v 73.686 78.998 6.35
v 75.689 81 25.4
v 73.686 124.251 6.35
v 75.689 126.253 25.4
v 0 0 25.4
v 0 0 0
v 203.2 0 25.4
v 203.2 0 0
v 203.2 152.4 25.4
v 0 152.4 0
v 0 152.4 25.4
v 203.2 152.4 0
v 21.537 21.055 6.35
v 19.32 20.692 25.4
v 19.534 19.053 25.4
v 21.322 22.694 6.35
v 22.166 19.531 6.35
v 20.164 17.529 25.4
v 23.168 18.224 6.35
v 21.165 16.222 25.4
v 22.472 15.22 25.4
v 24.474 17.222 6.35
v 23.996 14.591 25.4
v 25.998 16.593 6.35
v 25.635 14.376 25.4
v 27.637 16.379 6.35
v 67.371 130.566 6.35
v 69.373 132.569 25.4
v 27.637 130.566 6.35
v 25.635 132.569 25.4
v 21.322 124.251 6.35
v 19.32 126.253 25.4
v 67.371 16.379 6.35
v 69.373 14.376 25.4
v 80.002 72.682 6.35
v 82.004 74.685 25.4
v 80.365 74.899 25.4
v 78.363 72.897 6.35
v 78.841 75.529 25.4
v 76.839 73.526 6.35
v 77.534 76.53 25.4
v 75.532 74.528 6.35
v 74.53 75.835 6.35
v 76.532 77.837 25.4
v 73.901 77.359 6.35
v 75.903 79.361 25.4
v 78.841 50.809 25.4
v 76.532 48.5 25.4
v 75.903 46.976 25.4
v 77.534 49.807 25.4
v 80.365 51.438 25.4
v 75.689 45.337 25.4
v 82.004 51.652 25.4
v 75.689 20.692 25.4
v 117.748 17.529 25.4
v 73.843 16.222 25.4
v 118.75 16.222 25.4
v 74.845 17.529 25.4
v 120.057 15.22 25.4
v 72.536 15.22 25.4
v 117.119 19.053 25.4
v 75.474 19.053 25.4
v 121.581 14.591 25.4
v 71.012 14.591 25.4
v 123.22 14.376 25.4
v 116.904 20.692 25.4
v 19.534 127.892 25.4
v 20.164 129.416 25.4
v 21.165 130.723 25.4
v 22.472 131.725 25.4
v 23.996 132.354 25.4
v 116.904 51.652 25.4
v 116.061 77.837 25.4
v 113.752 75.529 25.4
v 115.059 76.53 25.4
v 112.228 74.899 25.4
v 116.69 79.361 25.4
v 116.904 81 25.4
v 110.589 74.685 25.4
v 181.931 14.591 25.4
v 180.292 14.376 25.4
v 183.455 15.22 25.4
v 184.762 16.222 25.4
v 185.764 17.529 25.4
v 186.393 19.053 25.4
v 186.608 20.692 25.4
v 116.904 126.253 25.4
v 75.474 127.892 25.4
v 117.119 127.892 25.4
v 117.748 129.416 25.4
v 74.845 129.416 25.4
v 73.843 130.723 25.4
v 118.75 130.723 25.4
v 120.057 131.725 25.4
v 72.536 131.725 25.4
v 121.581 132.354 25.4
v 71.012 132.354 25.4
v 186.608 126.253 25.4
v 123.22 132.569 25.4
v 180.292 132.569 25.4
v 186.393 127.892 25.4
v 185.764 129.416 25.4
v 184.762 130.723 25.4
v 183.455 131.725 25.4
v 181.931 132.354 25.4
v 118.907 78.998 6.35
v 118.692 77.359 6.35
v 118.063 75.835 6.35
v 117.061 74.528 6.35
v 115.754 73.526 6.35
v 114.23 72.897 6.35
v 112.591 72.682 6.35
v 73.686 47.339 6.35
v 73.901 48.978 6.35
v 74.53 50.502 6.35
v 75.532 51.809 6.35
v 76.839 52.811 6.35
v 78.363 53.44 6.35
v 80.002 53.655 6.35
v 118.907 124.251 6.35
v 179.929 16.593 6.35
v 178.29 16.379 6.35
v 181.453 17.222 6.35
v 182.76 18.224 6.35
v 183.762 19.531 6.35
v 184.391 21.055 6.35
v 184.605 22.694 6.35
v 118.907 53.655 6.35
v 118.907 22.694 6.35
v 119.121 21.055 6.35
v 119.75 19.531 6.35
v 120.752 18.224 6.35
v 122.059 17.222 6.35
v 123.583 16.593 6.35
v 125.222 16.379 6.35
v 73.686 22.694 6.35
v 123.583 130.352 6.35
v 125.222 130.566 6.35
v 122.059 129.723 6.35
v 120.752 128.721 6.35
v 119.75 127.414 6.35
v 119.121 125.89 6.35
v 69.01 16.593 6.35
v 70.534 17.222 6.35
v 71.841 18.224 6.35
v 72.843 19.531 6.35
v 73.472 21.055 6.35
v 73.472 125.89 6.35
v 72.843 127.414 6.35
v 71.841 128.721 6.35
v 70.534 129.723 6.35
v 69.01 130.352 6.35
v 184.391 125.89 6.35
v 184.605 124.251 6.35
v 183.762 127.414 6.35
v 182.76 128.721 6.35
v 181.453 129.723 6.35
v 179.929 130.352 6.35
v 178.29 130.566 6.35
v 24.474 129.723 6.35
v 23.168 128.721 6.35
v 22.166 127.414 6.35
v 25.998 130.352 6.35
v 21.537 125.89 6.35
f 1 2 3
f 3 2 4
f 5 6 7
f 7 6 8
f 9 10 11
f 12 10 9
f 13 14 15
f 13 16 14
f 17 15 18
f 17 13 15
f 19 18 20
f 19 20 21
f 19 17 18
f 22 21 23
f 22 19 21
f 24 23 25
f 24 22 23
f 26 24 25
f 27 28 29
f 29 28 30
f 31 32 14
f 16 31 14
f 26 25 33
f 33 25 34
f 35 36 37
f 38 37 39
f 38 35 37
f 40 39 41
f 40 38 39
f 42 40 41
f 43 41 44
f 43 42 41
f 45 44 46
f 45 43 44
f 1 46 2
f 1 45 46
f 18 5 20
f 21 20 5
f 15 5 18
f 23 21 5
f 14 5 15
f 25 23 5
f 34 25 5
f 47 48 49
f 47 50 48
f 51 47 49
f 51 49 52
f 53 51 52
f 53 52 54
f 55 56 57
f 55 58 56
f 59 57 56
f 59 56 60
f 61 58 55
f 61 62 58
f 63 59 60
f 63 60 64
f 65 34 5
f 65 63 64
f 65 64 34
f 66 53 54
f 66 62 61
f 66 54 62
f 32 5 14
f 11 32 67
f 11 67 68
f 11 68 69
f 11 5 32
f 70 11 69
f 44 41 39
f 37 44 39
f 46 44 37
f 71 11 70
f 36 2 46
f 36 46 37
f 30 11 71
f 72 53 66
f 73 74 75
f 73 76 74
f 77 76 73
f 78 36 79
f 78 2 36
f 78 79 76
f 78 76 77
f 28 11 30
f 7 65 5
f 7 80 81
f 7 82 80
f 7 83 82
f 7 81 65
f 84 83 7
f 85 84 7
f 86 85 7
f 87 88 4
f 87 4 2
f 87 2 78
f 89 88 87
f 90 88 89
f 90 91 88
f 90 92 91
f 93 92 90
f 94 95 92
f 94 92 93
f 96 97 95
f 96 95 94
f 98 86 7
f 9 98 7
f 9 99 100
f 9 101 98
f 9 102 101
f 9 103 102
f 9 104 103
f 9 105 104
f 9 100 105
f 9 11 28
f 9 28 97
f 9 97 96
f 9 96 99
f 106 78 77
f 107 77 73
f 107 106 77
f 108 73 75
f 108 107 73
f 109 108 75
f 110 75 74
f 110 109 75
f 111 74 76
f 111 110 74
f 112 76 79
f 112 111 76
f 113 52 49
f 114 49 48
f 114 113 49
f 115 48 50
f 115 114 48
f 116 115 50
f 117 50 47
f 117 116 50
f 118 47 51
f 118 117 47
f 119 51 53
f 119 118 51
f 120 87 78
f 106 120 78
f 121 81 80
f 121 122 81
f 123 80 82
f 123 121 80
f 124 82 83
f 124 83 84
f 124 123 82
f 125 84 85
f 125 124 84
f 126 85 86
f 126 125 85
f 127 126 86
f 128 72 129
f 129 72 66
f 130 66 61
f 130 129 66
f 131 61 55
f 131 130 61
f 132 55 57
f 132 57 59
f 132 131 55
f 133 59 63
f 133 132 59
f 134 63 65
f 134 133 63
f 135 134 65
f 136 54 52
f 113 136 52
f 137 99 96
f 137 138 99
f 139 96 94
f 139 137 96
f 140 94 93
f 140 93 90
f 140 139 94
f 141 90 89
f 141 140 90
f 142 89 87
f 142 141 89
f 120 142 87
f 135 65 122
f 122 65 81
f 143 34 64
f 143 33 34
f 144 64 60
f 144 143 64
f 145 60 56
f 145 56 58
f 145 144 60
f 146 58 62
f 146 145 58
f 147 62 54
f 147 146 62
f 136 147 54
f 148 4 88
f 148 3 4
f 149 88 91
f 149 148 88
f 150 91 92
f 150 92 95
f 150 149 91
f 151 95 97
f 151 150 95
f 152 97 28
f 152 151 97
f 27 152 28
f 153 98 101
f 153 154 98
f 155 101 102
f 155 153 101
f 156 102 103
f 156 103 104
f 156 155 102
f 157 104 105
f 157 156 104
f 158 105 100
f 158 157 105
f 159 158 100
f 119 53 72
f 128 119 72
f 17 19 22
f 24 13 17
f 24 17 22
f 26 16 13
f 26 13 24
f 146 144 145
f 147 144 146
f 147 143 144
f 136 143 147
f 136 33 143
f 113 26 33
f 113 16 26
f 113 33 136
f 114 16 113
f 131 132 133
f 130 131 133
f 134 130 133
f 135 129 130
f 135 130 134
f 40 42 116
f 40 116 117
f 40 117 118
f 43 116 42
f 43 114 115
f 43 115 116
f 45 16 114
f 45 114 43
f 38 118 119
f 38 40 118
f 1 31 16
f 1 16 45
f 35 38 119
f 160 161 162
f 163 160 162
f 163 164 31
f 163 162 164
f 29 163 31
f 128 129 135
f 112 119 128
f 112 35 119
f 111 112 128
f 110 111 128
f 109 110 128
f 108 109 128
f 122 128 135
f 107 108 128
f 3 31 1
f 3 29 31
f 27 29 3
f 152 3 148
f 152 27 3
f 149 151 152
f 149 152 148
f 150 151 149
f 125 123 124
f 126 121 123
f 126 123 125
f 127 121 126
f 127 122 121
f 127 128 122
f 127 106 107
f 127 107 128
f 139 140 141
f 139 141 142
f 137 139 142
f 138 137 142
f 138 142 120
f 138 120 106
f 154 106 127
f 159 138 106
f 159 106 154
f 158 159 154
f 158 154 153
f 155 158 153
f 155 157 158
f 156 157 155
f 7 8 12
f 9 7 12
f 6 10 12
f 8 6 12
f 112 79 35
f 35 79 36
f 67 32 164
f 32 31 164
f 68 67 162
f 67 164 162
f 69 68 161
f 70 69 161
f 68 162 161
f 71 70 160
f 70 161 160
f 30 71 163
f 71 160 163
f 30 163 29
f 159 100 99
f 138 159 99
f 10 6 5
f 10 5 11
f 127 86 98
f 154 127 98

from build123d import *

# Parameters (mm, degrees)
SKETCH1_W          = 203.2
SKETCH1_H          = 152.4
EXTRUDE1_DEPTH     = 25.4
CUT_EXTRUDE1_DEPTH = 19.05
CUT_EXTRUDE1_DRAFT = -6
FILLET1_R          = 6.35


with BuildPart() as part:
    # Sketch1 → Extrude1 (new body)
    with BuildSketch(Plane.XY):
        with Locations((101.6, 76.2)):
            Rectangle(SKETCH1_W, SKETCH1_H)
    extrude(amount=EXTRUDE1_DEPTH)


with BuildPart() as cut_extrude1_tool:
    # Sketch2 → Cut-Extrude1 (with draft: the straight prism first)
    with BuildSketch(Plane.XY.offset(25.4)):
        Polygon((19.319910515, 132.568680089), (19.319910515, 14.376286353), (75.688590604, 14.376286353), (75.688590604, 51.652348993), (116.904399702, 51.652348993), (116.904399702, 14.376286353), (186.607606264, 14.376286353), (186.607606264, 132.568680089), (116.904399702, 132.568680089), (116.904399702, 74.684712901), (75.688590604, 74.684712901), (75.688590604, 132.568680089), align=None)
    extrude(amount=-CUT_EXTRUDE1_DEPTH)
    # Cut-Extrude1: the draft: its side faces are tilted about the plane it starts from
    cut_extrude1_sides = [cut_extrude1_tool.faces().sort_by_distance(p)[0] for p in [
        (19.319910515, 73.472483221, 15.875),
        (47.504250559, 14.376286353, 15.875),
        (75.688590604, 33.014317673, 15.875),
        (96.296495153, 51.652348993, 15.875),
        (116.904399702, 33.014317673, 15.875),
        (151.756002983, 14.376286353, 15.875),
        (186.607606264, 73.472483221, 15.875),
        (151.756002983, 132.568680089, 15.875),
        (116.904399702, 103.626696495, 15.875),
        (96.296495153, 74.684712901, 15.875),
        (75.688590604, 103.626696495, 15.875),
        (47.504250559, 132.568680089, 15.875),
    ]]
    draft(cut_extrude1_sides, Plane.XY.offset(25.4), CUT_EXTRUDE1_DRAFT)


with BuildPart() as part_1:
    add(part.part)

    # Cut-Extrude1: cut by cut_extrude1_tool
    add(cut_extrude1_tool.part, mode=Mode.SUBTRACT)

    # Fillet1
    fillet1_edges = [part_1.edges().sort_by_distance(p)[0] for p in [
        (20.321028355, 131.567562249, 15.875),
        (20.321028355, 15.377404194, 15.875),
        (74.687472763, 15.377404194, 15.875),
        (74.687472763, 52.653466834, 15.875),
        (117.905517543, 15.377404194, 15.875),
        (185.606488423, 15.377404194, 15.875),
        (185.606488423, 131.567562249, 15.875),
        (117.905517543, 131.567562249, 15.875),
        (117.905517543, 73.68359506, 15.875),
        (74.687472763, 73.68359506, 15.875),
        (74.687472763, 131.567562249, 15.875),
    ]]
    fillet(fillet1_edges, radius=FILLET1_R)


solid = part_1.part
